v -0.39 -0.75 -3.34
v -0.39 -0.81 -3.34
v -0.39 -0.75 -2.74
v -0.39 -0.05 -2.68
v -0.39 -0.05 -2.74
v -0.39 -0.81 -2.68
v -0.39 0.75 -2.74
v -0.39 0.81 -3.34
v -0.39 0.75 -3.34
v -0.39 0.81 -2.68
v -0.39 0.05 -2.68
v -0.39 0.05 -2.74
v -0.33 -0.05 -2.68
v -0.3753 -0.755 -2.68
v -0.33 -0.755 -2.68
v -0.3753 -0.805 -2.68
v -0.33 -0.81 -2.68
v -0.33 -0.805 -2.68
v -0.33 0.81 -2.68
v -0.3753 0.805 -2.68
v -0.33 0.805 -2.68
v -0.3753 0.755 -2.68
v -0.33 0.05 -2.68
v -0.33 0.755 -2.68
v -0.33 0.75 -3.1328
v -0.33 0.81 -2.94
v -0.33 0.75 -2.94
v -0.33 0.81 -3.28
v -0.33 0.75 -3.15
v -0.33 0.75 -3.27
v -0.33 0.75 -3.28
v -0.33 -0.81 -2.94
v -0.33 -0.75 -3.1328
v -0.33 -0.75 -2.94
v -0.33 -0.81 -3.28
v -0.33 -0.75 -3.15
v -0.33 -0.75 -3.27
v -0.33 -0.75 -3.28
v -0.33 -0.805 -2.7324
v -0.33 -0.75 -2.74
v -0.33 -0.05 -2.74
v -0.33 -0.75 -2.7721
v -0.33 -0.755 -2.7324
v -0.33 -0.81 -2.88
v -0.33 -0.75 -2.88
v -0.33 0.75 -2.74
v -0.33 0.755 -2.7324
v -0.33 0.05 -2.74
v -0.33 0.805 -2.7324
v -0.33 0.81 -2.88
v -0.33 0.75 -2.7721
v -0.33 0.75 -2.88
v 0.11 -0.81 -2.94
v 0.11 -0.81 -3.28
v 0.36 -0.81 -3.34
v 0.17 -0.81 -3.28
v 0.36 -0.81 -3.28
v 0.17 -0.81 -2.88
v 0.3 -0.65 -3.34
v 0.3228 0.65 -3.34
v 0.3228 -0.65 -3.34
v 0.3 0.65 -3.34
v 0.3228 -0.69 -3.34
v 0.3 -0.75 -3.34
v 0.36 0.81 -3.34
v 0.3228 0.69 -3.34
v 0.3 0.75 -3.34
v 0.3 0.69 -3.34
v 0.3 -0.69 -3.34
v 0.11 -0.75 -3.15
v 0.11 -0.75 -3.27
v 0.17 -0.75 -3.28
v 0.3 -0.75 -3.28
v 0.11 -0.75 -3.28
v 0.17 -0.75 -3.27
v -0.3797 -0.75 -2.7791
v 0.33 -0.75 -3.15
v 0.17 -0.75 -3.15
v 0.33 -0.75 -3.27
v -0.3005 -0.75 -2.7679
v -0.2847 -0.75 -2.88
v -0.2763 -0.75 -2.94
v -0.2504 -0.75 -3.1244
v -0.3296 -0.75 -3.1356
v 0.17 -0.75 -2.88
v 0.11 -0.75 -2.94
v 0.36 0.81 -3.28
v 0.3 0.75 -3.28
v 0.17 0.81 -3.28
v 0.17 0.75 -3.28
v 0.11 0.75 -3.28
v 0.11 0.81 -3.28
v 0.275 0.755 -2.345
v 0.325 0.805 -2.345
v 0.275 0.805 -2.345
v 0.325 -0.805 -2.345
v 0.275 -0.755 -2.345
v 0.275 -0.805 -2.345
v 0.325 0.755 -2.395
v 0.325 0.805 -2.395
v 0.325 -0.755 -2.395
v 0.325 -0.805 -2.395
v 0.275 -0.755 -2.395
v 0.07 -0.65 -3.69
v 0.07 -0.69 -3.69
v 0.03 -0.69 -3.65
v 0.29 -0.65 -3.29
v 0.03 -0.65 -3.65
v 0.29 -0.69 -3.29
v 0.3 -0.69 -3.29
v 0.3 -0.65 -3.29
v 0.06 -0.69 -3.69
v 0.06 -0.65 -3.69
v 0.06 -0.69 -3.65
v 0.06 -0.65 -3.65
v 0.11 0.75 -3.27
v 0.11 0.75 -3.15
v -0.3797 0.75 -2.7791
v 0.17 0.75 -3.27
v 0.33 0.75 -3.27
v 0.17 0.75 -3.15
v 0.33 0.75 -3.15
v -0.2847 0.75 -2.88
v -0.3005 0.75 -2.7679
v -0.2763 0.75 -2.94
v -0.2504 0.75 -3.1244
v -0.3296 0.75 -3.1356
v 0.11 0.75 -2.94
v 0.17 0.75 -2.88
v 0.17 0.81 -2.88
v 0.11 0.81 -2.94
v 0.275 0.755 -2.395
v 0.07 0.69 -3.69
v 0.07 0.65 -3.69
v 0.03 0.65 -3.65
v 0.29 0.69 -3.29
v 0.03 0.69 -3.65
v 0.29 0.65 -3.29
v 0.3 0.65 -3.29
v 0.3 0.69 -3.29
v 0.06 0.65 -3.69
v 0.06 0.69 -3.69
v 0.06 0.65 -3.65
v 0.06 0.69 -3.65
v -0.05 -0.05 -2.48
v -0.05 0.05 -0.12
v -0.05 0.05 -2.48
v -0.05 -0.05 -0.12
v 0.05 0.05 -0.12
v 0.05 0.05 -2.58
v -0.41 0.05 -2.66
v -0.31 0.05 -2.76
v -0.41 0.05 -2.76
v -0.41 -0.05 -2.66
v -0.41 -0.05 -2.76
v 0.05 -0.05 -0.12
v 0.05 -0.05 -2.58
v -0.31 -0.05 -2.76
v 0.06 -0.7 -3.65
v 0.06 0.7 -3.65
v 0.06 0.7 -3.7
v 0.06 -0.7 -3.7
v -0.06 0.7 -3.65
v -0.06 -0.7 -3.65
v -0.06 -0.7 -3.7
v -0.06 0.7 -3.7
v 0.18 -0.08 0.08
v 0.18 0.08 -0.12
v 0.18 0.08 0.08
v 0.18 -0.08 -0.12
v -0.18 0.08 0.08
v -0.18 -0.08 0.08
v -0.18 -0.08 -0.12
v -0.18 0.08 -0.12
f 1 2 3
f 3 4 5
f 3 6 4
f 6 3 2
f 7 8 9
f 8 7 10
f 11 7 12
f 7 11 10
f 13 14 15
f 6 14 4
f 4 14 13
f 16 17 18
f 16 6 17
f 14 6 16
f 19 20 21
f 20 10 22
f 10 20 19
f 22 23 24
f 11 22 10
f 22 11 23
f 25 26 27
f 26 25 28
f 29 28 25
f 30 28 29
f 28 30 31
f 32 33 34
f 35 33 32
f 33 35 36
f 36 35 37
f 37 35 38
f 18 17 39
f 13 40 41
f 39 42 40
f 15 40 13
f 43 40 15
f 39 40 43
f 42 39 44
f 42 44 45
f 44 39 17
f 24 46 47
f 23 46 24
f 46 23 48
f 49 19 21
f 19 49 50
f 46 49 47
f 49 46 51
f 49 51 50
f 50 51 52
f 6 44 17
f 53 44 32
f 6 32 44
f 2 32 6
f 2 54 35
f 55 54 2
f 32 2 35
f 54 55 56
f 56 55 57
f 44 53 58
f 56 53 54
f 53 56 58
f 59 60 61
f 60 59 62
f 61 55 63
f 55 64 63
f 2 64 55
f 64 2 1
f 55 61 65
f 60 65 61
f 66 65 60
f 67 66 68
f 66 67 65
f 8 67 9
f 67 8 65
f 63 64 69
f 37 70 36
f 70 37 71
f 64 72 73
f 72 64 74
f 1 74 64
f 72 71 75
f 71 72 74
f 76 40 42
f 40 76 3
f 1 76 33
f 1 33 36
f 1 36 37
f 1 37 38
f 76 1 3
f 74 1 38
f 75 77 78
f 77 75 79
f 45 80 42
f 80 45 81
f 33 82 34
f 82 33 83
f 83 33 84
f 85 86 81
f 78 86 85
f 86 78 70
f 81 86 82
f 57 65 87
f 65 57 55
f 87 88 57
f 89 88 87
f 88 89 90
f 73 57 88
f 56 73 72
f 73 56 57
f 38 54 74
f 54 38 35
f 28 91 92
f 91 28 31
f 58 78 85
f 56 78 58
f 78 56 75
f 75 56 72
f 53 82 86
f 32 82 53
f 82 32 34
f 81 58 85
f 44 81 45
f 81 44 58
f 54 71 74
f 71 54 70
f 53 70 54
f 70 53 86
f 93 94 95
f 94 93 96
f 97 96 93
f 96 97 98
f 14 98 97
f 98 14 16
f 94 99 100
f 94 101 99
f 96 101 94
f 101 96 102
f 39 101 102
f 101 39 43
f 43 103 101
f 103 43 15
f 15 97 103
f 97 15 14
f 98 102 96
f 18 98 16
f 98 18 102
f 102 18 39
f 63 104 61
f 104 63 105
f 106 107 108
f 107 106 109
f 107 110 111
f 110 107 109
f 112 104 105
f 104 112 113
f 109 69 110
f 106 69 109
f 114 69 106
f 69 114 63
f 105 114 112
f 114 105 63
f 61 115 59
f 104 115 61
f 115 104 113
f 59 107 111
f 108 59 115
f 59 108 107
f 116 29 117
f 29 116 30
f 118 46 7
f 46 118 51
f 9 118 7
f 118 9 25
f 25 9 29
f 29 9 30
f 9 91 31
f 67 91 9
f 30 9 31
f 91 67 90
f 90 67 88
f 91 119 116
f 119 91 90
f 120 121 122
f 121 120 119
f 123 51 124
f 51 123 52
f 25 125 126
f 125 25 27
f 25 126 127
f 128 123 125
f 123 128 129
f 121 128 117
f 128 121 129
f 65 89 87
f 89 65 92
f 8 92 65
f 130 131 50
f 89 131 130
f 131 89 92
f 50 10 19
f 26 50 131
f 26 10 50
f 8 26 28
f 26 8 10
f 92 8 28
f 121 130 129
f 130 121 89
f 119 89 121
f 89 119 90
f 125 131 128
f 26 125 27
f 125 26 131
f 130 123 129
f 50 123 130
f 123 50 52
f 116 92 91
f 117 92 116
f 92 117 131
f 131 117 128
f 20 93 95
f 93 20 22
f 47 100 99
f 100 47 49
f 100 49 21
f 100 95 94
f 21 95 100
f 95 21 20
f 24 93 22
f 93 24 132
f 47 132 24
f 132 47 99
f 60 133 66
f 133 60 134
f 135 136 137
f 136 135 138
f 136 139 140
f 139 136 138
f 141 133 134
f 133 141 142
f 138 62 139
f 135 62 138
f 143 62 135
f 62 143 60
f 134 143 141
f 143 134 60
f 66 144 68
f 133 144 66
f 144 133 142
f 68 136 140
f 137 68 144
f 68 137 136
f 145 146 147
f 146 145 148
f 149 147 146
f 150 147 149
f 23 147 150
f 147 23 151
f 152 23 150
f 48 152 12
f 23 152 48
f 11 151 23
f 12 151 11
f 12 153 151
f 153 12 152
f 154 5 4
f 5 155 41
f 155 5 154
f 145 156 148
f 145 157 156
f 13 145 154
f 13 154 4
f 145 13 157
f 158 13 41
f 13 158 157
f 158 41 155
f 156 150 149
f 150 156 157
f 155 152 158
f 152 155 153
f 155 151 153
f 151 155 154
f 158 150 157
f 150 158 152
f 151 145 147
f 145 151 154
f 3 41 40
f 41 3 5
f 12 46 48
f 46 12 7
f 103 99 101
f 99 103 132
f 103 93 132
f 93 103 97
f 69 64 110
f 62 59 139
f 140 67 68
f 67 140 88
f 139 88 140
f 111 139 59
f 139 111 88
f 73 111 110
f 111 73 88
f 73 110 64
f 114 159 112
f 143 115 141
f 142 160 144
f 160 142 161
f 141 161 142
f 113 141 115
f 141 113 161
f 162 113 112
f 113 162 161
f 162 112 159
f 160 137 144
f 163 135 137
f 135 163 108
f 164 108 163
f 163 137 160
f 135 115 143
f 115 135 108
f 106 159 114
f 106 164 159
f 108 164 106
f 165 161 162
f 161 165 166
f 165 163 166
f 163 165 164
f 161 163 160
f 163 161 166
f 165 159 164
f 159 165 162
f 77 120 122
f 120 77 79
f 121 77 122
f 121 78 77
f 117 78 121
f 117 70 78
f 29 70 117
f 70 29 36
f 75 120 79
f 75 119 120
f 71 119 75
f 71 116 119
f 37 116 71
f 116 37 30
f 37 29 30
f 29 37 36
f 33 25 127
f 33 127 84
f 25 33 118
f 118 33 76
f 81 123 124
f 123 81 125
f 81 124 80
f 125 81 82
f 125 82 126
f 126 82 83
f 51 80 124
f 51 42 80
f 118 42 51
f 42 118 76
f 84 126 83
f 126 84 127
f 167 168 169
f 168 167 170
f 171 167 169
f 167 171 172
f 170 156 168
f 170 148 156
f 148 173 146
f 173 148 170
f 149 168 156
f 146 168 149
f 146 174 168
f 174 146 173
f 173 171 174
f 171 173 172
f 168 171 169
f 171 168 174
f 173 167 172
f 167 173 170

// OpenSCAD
// file: lib/chair_kit.scad
// Chair kit — the chairlift chair shared by the double, quad, and 6-pack
// (chair.scad, chair_quad.scad, chair_6pack.scad), which differ in width,
// cushion colour, and hanger weight.
//
//     +X = forward (direction the chair travels along the cable)
//     +Y = seat width (lateral, perpendicular to cable)
//     +Z = up
//
// The origin is the cable-attachment point and the chair hangs in -Z. A
// grip clamps the cable; a hanger drops behind the riders to a yoke over
// the backrest; side frames carry the seat, armrests, and a restraint bar
// (shown raised); a footrest hangs under the riders' feet. Riders are
// placed by the slots with their feet on the footrest, which hangs
// cable_h below the cable: the cable's height at a station
// (world.BullwheelHeight), so at the bullwheel a rider's skis are on the
// snow as the chair picks them up or sets them down. Everything else
// hangs from the seat height that gives.
//
// Conventions, units, and axis docs: see models-src/README.md.

$fn = 10;

// ── Shared dimensions (metres) ─────────────────────────────────────────
cable_h       = 3.65;  // world.BullwheelHeight
chair_depth   = 0.66;  // seat front to back (X)
foot_top_z    = -cable_h;          // footrest top: where riders' feet go (the slots)
seat_top_z    = foot_top_z + 0.50; // top of the seat cushion
seat_cushion  = 0.12;
seat_frame_z  = seat_top_z - seat_cushion - 0.04; // bar under the cushion
back_x        = -chair_depth / 2;                 // back edge of the seat
back_bot_z    = seat_top_z + 0.02;
back_top_z    = seat_top_z + 0.38;
back_cushion  = 0.08;
yoke_z        = seat_top_z + 0.44; // the bar over the backrest
restraint_z   = seat_top_z + 0.78; // the raised restraint bar, clear of riders' heads
grip_len      = 0.36;
foot_x        = 0;     // under the riders, at the slots' X
bar          = 0.06;   // frame tube section
frame_color   = [0.24, 0.26, 0.29];
grip_color    = [0.55, 0.57, 0.60];

// A box between two points, `s` thick: a frame tube.
module tube(a, b, s = bar) {
    hull() {
        translate(a) cube(s, center = true);
        translate(b) cube(s, center = true);
    }
}

// ── The chair ──────────────────────────────────────────────────────────
// w: seat width; cushion: seat and backrest colour; hanger: hanger section.
module chair(w, cushion, hanger = 0.10) {
    half = w / 2;
    ex = half + 0.03; // side frames, just outside the seat

    // Grip on the cable.
    color(grip_color)
        translate([0, 0, -0.02])
            cube([grip_len, 0.16, 0.20], center = true);

    color(frame_color) {
        // Hanger: down from the grip, then back over the riders' heads to
        // the yoke.
        tube([0, 0, -0.08], [0, 0, yoke_z + 0.18], hanger);
        tube([0, 0, yoke_z + 0.18], [back_x - 0.03, 0, yoke_z], hanger);
        // Yoke over the backrest, the full width.
        tube([back_x - 0.03, -ex, yoke_z], [back_x - 0.03, ex, yoke_z]);
        for (s = [-1, 1]) {
            y = s * ex;
            // Side frame: down the back, then forward under the seat.
            tube([back_x - 0.03, y, yoke_z], [back_x - 0.03, y, seat_frame_z]);
            tube([back_x - 0.03, y, seat_frame_z], [-back_x, y, seat_frame_z]);
            // Armrest with a post at its front.
            tube([back_x - 0.03, y, seat_top_z + 0.24], [0.14, y, seat_top_z + 0.24]);
            tube([0.14, y, seat_top_z + 0.24], [0.14, y, seat_frame_z]);
            // Restraint bar arm, raised: from the yoke up and forward.
            tube([back_x - 0.03, y, yoke_z], [0.30, y, restraint_z], 0.05);
            // Footrest hanger from the front of the seat.
            tube([-back_x - 0.02, s * (half - 0.08), seat_frame_z],
                 [foot_x + 0.05, s * (half - 0.08), foot_top_z - 0.02], 0.04);
        }
        // Restraint bar across the front, raised clear of the riders.
        tube([0.30, -ex, restraint_z], [0.30, ex, restraint_z], 0.05);
        // Cross tube under the front of the seat.
        tube([-back_x, -ex, seat_frame_z], [-back_x, ex, seat_frame_z]);
        // Footrest: the riders stand their skis on it.
        translate([foot_x, 0, foot_top_z - 0.025])
            cube([0.12, w - 0.1, 0.05], center = true);
    }

    color(cushion) {
        // Seat cushion.
        translate([0, 0, seat_top_z - seat_cushion / 2])
            cube([chair_depth, w, seat_cushion], center = true);
        // Backrest cushion, leaning back a touch.
        translate([back_x + back_cushion / 2, 0, back_bot_z])
            rotate([0, -8, 0])
                translate([0, 0, (back_top_z - back_bot_z) / 2])
                    cube([back_cushion, w, back_top_z - back_bot_z], center = true);
    }
}
// main file
// Chairlift chair — a fixed-grip double, built from the chair kit
// (lib/chair_kit.scad: grip, hanger, frame, cushions, raised restraint
// bar, footrest). Hangs below the cable at its attachment point.
//
// Conventions, units, and axis docs: see models-src/README.md.

include <lib/chair_kit.scad>

seat_w = 1.50; // 2-person, mid of real range (1.4 m for 2-seater)

chair(seat_w, [0.70, 0.22, 0.20], hanger = 0.10);

// ── Passenger seat anchors ─────────────────────────────────────────────
// Slot positions (SCAD coords) for the simulation to anchor riders to.
// scad2obj captures these from openscad's echo() output and bakes them
// into chair.obj as `# slot` comment lines (already converted to game
// coords). See tools/scad2obj/main.go for the protocol.
//
// The agent mesh's origin is at its feet, so slot_z is the top of the
// footrest: the rider resting their boots on it.
slot_x         = 0;          // centred along seat depth
slot_lateral_y = 0.40;       // half the space between two riders
slot_z         = foot_top_z;
echo("MOGUL_META", "slot", 0, slot_x,  slot_lateral_y, slot_z);
echo("MOGUL_META", "slot", 1, slot_x, -slot_lateral_y, slot_z);
